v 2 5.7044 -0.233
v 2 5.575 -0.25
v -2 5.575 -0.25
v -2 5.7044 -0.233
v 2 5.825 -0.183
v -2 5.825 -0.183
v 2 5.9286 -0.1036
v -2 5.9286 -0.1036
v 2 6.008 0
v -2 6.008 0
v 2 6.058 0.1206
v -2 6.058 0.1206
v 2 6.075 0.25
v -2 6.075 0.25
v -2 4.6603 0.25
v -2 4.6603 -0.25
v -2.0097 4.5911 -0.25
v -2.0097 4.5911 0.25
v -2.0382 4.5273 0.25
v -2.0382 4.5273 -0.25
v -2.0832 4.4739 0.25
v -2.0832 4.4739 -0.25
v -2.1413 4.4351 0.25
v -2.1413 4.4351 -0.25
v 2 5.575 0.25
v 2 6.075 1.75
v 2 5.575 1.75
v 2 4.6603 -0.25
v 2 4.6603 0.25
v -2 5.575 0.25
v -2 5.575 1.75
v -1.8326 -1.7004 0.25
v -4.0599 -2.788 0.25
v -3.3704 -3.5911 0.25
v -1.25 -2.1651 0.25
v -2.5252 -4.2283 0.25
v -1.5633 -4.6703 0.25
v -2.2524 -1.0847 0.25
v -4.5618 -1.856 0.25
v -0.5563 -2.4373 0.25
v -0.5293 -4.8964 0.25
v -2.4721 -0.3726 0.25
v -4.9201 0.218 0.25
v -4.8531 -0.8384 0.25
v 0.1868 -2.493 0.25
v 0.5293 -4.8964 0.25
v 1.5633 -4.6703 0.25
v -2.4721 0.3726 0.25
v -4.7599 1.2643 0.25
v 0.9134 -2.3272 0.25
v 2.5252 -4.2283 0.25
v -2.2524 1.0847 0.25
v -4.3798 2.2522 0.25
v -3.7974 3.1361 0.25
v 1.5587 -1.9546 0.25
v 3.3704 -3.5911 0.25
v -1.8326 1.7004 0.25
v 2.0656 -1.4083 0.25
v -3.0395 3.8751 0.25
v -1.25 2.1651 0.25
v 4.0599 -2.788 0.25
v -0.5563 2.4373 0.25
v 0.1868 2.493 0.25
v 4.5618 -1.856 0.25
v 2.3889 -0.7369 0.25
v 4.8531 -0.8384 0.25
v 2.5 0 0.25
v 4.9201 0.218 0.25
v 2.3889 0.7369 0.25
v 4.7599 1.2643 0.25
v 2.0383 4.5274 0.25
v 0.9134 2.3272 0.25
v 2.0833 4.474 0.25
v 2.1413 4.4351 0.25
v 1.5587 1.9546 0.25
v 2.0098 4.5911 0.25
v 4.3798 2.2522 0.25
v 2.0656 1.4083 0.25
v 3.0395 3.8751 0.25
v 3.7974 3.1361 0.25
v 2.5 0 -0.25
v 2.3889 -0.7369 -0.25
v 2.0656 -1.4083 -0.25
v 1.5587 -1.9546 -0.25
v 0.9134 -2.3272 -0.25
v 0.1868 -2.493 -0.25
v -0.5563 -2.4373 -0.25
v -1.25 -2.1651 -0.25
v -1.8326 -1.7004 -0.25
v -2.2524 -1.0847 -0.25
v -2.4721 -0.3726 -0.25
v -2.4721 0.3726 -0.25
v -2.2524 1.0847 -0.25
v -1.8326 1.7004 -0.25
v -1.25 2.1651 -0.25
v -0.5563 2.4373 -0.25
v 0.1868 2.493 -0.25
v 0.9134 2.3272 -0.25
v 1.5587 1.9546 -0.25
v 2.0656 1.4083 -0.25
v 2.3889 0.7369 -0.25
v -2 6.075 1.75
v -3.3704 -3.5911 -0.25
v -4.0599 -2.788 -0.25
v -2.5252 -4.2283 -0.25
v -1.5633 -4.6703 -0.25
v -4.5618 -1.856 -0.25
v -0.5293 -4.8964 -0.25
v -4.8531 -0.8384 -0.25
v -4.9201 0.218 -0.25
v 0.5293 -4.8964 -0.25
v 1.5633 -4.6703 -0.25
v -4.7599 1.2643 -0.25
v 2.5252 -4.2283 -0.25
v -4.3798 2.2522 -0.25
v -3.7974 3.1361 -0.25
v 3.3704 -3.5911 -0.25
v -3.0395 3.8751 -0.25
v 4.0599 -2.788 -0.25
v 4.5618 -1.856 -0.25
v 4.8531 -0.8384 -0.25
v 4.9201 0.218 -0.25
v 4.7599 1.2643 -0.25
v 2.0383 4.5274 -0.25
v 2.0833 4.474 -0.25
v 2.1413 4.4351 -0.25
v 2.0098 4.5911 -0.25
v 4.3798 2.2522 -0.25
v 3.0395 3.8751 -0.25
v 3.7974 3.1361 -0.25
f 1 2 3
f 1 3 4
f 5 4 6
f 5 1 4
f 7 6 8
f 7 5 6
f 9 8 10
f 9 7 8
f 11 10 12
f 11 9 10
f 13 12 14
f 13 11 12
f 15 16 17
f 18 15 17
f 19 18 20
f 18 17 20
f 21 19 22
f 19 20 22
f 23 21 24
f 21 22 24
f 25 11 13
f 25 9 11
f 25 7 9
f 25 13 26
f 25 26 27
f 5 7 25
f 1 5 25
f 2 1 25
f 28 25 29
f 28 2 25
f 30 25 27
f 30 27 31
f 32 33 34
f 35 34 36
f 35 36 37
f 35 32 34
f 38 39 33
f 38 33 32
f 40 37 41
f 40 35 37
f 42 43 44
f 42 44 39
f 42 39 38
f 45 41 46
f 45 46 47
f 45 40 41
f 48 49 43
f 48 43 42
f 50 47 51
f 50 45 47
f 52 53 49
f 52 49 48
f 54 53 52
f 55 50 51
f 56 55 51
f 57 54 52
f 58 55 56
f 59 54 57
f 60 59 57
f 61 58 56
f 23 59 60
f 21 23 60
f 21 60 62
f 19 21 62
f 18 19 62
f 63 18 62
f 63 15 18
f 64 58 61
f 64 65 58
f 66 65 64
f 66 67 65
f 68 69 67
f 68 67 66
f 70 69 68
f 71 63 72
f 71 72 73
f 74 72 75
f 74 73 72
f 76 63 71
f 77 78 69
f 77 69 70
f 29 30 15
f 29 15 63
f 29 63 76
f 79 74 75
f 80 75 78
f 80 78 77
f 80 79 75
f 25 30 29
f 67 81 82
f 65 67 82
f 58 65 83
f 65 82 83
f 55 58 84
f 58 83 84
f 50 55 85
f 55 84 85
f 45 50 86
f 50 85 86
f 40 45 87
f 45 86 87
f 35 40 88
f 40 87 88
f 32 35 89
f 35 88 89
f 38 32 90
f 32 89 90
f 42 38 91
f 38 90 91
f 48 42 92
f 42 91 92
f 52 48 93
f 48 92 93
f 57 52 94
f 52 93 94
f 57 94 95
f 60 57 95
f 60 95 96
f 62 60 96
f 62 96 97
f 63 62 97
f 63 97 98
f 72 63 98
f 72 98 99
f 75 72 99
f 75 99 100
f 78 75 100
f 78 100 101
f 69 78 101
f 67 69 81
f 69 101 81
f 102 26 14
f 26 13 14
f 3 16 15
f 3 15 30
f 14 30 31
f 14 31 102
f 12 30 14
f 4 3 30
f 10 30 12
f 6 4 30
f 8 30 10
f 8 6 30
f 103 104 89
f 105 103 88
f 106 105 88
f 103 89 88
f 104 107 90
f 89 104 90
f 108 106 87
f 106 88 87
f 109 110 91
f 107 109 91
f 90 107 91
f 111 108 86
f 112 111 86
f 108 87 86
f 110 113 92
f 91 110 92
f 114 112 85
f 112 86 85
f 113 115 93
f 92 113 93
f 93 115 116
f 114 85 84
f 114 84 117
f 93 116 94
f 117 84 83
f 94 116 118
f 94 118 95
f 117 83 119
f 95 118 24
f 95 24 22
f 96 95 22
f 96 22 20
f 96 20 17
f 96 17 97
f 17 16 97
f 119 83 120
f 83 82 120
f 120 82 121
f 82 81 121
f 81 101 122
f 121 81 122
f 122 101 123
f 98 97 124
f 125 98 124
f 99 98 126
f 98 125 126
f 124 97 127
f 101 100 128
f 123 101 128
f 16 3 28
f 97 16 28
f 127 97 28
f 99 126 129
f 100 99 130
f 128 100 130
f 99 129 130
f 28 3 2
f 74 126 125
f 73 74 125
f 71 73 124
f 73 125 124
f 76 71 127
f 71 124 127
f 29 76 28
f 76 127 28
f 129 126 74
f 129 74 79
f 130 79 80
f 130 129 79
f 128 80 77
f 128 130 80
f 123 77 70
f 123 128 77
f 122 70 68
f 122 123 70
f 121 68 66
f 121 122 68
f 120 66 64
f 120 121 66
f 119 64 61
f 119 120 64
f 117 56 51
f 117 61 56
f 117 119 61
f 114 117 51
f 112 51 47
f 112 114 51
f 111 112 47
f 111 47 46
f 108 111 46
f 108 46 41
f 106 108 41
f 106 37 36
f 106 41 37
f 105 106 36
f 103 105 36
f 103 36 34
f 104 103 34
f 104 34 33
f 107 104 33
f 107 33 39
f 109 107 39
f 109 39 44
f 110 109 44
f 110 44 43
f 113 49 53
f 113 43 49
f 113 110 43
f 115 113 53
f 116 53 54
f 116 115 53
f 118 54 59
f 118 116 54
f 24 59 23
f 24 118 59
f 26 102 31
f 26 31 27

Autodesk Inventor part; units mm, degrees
ref_plane "YZ Plane" through (0, 0, 0) normal (1, 0, 0) x (0, 1, 0)
ref_plane "XZ Plane" through (0, 0, 0) normal (0, 1, 0) x (-1, 0, 0)
ref_plane "XY Plane" through (0, 0, 0) normal (0, 0, 1) x (1, 0, 0)
sketch "Szkic1" plane through (0, 0, 0) normal (0, 0, 1) x (1, 0, 0)
  circle A0 centre (0, 0) radius 2.5
  arc A1 (-2.1413, 4.4351) -> (2.1413, 4.4351) centre (0, 0) ccw
  line L0 (-2, 6.075) -> (2, 6.075)
  line L1 (-2, 6.075) -> (-2, 4.6603)
  line L2 (2, 6.075) -> (2, 4.6603)
  arc A2 (-2.1413, 4.4351) -> (-2, 4.6603) centre (-2.25, 4.6603) ccw
  arc A3 (2, 4.6603) -> (2.1413, 4.4351) centre (2.25, 4.6603) ccw
  point P0 (-2, 4.5006)
  point P1 (2, 4.5006)
  dimension "d0" = 5
  dimension "d1" = 9.85
  dimension "d3" = 4
  dimension "d4" = 0.25
extrude "Wyciągnięcie proste1" add sketch "Szkic1" along normal mid plane 0.5
sketch "Szkic2" plane through (0, 0, 0.25) normal (0, 0, 1) x (1, 0, 0)
  line L0 (2, 6.075) -> (-2, 6.075) projected
  line L1 (-2, 6.075) -> (2, 6.075)
  line L2 (2, 6.075) -> (2, 5.575)
  line L3 (2, 5.575) -> (-2, 5.575)
  line L4 (-2, 5.575) -> (-2, 6.075)
  dimension "d7" = 0.5
extrude "Wyciągnięcie proste2" add sketch "Szkic2" along normal blind 1.5
fillet "Zaokrąglenie1" radius 0.5 1 edges at (0, 6.075, -0.25)
properties part number "podkładka z jednym uchem" material "Stal"
